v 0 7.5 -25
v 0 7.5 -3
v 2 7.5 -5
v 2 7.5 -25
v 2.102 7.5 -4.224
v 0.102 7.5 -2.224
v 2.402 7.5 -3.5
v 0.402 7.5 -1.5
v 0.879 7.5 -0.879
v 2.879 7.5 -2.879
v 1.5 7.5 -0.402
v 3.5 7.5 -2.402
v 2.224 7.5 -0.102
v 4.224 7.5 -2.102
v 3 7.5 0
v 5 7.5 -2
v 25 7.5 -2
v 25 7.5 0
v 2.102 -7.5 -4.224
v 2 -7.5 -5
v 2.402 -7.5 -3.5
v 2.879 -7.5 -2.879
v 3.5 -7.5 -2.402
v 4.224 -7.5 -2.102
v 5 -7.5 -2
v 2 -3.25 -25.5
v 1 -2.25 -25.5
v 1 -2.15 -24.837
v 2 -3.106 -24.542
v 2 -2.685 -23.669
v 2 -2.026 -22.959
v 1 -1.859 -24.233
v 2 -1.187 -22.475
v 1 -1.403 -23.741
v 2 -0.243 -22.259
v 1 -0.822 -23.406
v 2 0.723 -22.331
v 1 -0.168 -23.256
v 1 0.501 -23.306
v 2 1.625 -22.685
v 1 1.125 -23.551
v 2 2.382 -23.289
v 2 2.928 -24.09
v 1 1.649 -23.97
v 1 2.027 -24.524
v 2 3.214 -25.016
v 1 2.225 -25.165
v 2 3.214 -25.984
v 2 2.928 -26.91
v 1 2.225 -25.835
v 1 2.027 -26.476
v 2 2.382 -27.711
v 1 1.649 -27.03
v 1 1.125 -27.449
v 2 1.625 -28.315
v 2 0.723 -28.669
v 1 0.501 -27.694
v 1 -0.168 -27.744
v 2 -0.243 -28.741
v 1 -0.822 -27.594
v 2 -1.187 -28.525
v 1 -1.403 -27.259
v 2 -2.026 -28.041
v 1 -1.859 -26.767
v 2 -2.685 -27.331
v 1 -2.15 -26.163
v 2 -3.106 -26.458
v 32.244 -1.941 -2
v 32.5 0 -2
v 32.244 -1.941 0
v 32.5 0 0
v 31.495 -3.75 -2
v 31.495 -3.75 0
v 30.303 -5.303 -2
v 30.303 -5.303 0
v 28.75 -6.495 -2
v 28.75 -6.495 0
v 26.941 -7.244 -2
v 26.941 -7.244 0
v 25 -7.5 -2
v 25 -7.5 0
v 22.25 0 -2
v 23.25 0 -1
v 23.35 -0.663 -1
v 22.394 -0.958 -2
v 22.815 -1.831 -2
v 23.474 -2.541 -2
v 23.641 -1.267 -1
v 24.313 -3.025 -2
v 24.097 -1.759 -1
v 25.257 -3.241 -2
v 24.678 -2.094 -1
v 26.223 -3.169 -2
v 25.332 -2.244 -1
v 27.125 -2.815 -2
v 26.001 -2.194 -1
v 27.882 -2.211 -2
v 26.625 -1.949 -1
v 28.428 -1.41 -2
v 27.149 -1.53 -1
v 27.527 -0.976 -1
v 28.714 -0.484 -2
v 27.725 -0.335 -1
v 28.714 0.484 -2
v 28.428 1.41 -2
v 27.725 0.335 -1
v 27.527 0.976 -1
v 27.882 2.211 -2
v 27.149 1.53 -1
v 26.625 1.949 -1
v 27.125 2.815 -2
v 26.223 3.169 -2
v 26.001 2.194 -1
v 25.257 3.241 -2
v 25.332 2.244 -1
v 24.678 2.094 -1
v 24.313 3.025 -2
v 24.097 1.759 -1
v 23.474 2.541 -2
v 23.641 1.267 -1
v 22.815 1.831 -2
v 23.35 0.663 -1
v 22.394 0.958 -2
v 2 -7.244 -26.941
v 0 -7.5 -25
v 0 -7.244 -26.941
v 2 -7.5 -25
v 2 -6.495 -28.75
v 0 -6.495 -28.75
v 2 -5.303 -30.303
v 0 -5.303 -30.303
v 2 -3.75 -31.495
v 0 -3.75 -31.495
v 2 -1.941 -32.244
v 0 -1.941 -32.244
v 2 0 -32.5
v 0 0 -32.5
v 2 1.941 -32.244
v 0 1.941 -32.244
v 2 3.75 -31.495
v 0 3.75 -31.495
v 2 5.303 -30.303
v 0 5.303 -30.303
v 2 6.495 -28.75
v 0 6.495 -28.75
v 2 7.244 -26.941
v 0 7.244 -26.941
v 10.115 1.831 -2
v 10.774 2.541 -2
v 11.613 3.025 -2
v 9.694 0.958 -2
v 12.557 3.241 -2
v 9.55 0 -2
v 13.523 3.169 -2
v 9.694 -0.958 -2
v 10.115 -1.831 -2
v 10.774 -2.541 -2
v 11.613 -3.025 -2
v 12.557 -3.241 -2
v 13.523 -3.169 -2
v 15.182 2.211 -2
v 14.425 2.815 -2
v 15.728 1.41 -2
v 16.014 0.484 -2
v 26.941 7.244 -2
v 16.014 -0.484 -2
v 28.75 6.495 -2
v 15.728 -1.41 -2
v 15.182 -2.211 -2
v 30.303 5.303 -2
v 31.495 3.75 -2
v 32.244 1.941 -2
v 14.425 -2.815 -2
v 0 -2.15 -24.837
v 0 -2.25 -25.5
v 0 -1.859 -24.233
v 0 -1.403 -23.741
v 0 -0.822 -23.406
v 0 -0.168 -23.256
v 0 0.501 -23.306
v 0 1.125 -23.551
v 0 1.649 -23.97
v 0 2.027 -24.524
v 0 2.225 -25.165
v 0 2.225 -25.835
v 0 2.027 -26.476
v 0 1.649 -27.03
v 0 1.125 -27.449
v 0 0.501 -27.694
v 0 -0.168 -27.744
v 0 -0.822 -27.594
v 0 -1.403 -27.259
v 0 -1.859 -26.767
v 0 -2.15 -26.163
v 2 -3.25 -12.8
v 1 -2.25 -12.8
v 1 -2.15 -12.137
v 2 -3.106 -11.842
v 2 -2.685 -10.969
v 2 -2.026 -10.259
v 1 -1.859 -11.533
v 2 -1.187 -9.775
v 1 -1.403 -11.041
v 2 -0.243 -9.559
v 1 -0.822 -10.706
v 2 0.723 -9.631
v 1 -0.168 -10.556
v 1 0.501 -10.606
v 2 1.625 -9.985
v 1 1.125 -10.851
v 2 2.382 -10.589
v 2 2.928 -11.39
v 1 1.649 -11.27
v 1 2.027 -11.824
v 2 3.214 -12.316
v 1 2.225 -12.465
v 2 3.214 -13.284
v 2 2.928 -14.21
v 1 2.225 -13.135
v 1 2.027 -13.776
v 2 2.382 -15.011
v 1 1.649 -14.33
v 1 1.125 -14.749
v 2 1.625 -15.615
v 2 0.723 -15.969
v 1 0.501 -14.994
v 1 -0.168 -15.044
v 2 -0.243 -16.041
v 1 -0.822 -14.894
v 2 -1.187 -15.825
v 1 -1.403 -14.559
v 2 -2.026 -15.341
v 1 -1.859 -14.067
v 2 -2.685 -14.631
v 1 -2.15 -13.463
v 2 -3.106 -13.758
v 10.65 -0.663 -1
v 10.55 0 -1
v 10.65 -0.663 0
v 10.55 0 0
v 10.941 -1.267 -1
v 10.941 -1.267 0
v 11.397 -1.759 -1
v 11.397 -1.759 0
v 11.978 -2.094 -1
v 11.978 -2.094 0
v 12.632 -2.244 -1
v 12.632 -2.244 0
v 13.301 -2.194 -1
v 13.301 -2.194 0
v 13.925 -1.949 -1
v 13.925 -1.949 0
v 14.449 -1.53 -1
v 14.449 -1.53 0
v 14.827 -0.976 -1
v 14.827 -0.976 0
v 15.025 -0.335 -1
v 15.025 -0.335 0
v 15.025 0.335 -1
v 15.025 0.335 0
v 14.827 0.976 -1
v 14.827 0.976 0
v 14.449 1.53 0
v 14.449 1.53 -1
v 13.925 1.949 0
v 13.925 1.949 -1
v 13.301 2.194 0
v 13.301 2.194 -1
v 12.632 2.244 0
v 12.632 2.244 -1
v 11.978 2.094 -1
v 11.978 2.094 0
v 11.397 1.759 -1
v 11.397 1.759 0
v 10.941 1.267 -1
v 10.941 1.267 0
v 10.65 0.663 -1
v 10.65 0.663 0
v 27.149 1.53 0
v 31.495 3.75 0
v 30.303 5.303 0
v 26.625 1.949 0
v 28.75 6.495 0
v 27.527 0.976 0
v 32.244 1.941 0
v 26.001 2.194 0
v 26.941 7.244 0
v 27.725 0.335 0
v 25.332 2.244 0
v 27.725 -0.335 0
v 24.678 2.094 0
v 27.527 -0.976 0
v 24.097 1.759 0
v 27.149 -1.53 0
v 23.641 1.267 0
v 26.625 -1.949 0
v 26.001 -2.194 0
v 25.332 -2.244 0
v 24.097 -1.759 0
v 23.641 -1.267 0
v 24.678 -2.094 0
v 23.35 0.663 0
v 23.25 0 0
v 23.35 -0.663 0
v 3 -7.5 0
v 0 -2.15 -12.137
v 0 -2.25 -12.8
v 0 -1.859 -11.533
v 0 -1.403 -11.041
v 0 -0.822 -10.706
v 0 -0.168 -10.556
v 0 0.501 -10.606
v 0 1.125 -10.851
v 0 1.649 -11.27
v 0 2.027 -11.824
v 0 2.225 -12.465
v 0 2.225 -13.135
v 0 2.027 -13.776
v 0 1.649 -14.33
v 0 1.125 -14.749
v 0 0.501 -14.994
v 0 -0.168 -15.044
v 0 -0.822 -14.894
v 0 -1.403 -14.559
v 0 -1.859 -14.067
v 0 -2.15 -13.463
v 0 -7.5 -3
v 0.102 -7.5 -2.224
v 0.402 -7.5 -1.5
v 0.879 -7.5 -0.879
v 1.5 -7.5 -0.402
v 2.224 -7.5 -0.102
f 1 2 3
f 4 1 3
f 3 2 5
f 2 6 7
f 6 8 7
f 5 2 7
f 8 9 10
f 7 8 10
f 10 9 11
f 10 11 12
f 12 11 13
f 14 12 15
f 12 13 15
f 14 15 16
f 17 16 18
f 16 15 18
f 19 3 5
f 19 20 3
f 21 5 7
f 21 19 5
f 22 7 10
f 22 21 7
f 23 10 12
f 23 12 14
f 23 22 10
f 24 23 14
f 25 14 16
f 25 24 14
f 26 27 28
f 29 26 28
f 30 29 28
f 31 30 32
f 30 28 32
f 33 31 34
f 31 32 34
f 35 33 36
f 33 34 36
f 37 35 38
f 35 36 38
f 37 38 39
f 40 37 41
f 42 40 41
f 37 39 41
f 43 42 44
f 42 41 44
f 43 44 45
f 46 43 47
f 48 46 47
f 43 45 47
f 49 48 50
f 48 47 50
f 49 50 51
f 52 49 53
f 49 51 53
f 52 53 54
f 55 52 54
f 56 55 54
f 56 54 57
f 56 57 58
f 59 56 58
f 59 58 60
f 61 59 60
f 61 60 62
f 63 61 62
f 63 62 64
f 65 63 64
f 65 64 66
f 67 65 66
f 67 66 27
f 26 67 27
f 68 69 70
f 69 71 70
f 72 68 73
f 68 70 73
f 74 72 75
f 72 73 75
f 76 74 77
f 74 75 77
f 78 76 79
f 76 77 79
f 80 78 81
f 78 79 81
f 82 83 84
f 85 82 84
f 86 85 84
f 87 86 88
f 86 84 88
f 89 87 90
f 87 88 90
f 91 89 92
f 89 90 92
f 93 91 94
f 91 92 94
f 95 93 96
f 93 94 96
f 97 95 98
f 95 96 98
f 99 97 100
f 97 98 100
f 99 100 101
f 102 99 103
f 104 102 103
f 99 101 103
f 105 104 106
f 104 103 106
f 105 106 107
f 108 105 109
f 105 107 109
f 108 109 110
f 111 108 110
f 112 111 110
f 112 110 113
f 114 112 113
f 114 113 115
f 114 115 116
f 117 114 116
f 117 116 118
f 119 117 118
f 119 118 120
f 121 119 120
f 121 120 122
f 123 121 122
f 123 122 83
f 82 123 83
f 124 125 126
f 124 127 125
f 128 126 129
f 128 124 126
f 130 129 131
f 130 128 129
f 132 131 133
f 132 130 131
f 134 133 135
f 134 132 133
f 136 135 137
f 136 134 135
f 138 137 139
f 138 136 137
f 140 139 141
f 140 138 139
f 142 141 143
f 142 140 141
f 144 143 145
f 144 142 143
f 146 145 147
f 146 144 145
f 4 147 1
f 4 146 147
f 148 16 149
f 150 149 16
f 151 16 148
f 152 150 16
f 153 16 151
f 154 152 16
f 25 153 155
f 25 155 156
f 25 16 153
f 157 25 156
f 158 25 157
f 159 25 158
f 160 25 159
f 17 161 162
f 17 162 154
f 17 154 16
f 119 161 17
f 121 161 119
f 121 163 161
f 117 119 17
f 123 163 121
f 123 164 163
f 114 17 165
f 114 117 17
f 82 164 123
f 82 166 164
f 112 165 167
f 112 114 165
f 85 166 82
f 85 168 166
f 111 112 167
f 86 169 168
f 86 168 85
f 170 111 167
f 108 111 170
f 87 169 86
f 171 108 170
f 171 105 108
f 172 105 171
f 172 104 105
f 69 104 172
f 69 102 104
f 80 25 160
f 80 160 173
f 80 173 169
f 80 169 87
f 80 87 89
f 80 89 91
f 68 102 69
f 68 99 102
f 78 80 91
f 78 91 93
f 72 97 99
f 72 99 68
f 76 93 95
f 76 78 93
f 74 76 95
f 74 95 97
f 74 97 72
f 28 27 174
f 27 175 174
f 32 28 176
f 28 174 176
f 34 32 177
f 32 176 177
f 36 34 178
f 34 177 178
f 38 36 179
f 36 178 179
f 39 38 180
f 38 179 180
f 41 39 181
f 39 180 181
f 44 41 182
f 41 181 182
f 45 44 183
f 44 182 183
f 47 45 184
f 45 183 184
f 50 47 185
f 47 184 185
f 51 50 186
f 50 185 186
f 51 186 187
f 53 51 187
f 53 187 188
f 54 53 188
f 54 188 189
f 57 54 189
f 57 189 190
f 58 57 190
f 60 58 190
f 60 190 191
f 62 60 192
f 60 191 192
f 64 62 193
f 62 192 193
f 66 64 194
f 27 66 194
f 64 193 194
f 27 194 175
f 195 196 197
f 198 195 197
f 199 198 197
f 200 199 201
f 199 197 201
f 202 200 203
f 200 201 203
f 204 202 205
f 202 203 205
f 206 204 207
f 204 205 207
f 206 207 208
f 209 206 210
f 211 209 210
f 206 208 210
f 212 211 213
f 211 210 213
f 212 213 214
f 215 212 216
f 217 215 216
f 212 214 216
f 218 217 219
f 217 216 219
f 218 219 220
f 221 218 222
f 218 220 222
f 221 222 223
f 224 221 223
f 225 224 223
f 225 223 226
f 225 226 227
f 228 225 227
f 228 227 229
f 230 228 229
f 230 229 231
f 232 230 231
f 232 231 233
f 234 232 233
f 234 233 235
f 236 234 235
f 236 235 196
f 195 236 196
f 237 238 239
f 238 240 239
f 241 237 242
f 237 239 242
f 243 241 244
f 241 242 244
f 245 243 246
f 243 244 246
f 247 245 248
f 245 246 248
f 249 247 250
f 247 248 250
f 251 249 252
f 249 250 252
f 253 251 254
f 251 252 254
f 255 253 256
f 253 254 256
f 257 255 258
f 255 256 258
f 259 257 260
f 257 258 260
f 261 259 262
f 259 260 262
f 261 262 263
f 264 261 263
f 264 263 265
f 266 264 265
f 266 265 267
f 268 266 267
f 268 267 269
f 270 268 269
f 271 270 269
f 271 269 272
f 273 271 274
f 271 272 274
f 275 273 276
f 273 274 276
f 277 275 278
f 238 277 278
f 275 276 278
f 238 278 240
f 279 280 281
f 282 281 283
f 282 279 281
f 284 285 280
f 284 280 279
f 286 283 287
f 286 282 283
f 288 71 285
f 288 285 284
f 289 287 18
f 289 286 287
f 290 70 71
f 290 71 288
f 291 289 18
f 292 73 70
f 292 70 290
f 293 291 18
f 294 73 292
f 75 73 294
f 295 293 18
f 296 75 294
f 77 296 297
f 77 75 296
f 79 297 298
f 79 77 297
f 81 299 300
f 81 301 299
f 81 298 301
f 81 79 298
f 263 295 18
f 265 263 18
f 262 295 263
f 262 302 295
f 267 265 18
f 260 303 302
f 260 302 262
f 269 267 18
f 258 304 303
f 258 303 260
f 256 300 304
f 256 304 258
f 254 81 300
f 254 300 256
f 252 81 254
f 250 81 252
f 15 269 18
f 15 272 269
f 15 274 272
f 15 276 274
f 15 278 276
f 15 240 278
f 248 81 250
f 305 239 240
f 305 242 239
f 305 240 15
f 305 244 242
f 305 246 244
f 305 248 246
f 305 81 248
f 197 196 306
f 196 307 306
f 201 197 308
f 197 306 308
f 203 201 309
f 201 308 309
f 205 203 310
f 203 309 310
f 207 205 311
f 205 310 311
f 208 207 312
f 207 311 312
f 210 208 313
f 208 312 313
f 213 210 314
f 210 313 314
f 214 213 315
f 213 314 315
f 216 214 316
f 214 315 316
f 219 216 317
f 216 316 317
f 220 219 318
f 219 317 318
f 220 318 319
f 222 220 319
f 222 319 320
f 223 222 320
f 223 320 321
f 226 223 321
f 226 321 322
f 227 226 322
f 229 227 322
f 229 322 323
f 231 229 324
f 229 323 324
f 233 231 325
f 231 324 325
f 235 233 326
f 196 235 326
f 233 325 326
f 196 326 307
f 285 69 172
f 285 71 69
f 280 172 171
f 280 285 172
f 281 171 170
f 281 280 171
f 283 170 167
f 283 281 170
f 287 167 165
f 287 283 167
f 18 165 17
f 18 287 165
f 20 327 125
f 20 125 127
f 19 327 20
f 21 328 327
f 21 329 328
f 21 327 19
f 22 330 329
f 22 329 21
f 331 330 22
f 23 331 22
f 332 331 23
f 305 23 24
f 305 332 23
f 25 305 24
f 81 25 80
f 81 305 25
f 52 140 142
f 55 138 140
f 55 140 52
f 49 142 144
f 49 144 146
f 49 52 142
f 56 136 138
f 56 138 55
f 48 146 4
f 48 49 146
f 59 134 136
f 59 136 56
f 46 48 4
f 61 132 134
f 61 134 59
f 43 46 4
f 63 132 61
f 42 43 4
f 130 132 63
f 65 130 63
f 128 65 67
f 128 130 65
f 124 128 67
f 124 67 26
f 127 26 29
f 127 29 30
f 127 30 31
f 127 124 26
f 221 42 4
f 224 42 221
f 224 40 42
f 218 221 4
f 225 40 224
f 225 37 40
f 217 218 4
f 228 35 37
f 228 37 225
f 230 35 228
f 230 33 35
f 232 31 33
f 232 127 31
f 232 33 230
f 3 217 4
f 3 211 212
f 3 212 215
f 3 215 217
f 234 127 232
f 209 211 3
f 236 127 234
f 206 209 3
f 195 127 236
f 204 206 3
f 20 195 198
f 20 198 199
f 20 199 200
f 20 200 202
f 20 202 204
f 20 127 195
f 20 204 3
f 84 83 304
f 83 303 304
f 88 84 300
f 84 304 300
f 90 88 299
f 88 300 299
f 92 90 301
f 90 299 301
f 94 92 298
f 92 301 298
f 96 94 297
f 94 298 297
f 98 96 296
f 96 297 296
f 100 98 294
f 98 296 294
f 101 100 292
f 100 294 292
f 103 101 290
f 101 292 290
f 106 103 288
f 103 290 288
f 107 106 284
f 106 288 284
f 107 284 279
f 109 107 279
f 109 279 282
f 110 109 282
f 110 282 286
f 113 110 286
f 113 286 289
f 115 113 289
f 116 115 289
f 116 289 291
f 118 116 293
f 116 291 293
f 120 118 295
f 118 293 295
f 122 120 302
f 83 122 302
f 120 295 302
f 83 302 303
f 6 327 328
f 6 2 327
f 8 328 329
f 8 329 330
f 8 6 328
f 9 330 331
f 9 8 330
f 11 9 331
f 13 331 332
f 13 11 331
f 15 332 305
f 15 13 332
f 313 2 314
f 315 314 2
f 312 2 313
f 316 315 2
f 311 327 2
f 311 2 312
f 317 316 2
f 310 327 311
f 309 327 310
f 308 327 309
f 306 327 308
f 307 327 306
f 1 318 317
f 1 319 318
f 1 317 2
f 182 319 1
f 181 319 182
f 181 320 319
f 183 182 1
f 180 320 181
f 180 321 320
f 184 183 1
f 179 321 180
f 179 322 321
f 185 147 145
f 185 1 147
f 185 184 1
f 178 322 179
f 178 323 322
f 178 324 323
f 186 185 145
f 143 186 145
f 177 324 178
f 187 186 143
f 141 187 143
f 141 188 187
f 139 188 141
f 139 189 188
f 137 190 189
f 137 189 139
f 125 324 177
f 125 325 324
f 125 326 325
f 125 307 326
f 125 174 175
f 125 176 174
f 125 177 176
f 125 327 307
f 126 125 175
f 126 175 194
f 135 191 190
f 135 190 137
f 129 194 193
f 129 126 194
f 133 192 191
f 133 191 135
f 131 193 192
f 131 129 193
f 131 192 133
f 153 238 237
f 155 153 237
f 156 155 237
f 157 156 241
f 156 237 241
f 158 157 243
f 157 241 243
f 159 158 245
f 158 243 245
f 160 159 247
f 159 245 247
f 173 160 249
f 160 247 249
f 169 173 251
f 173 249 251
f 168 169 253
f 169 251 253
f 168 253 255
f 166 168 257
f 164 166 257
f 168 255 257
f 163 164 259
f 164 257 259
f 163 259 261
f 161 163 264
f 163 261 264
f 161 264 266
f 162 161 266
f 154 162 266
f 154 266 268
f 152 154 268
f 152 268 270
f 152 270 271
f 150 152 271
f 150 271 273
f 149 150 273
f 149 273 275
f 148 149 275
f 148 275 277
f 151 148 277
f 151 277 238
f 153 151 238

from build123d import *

# Parameters (mm, degrees)
F1_DEPTH             = 7.5
F2_R                 = 7.49999
F3_R                 = 3
F6_D                 = 4.5
F6_CSINK_D           = 6.5
F6_CSINK_ANGLE       = 90
F6_ON_F5_D           = 4.5
F6_ON_F5_CSINK_D     = 6.5
F6_ON_F5_CSINK_ANGLE = 90


# Not quite as in the source:
# - a fillet or chamfer is up to 0.001 mm smaller than in the source, because OpenCascade refuses the exact size


with BuildPart() as f1:
    # F0 (on Front) → F1 (new body, symmetric)
    with BuildSketch(Plane.XZ):
        Polygon((0, 0), (0, -32.5), (2, -32.5), (2, -2), (32.5, -2), (32.5, 0), align=None)
    extrude(amount=F1_DEPTH, both=True)

    # F2 (radius 7.5 in the source; OpenCascade refuses exactly that, so slightly less here)
    f2_edges = [f1.edges().sort_by_distance(p)[0] for p in [
        (32.5, -7.5, -1),
        (32.5, 7.5, -1),
        (1, -7.5, -32.5),
        (1, 7.5, -32.5),
    ]]
    fillet(f2_edges, radius=F2_R)

    # F3
    f3_edges = [f1.edges().sort_by_distance(p)[0] for p in [
        (2, 0, -2),
        (0, 0, 0),
    ]]
    fillet(f3_edges, radius=F3_R)

    # F6 (through all)
    with Locations(Plane(origin=(0, 0, -2), x_dir=(1, 0, 0), z_dir=(0, 0, -1))):
        with Locations((12.8, 0), (25.5, 0)):
            CounterSinkHole(F6_D / 2, F6_CSINK_D / 2, counter_sink_angle=F6_CSINK_ANGLE)

    # F6 on F5 (through all)
    with Locations(Plane.YZ.offset(2)):
        with Locations((0, -25.5), (0, -12.8)):
            CounterSinkHole(F6_ON_F5_D / 2, F6_ON_F5_CSINK_D / 2, counter_sink_angle=F6_ON_F5_CSINK_ANGLE)


solid = f1.part
